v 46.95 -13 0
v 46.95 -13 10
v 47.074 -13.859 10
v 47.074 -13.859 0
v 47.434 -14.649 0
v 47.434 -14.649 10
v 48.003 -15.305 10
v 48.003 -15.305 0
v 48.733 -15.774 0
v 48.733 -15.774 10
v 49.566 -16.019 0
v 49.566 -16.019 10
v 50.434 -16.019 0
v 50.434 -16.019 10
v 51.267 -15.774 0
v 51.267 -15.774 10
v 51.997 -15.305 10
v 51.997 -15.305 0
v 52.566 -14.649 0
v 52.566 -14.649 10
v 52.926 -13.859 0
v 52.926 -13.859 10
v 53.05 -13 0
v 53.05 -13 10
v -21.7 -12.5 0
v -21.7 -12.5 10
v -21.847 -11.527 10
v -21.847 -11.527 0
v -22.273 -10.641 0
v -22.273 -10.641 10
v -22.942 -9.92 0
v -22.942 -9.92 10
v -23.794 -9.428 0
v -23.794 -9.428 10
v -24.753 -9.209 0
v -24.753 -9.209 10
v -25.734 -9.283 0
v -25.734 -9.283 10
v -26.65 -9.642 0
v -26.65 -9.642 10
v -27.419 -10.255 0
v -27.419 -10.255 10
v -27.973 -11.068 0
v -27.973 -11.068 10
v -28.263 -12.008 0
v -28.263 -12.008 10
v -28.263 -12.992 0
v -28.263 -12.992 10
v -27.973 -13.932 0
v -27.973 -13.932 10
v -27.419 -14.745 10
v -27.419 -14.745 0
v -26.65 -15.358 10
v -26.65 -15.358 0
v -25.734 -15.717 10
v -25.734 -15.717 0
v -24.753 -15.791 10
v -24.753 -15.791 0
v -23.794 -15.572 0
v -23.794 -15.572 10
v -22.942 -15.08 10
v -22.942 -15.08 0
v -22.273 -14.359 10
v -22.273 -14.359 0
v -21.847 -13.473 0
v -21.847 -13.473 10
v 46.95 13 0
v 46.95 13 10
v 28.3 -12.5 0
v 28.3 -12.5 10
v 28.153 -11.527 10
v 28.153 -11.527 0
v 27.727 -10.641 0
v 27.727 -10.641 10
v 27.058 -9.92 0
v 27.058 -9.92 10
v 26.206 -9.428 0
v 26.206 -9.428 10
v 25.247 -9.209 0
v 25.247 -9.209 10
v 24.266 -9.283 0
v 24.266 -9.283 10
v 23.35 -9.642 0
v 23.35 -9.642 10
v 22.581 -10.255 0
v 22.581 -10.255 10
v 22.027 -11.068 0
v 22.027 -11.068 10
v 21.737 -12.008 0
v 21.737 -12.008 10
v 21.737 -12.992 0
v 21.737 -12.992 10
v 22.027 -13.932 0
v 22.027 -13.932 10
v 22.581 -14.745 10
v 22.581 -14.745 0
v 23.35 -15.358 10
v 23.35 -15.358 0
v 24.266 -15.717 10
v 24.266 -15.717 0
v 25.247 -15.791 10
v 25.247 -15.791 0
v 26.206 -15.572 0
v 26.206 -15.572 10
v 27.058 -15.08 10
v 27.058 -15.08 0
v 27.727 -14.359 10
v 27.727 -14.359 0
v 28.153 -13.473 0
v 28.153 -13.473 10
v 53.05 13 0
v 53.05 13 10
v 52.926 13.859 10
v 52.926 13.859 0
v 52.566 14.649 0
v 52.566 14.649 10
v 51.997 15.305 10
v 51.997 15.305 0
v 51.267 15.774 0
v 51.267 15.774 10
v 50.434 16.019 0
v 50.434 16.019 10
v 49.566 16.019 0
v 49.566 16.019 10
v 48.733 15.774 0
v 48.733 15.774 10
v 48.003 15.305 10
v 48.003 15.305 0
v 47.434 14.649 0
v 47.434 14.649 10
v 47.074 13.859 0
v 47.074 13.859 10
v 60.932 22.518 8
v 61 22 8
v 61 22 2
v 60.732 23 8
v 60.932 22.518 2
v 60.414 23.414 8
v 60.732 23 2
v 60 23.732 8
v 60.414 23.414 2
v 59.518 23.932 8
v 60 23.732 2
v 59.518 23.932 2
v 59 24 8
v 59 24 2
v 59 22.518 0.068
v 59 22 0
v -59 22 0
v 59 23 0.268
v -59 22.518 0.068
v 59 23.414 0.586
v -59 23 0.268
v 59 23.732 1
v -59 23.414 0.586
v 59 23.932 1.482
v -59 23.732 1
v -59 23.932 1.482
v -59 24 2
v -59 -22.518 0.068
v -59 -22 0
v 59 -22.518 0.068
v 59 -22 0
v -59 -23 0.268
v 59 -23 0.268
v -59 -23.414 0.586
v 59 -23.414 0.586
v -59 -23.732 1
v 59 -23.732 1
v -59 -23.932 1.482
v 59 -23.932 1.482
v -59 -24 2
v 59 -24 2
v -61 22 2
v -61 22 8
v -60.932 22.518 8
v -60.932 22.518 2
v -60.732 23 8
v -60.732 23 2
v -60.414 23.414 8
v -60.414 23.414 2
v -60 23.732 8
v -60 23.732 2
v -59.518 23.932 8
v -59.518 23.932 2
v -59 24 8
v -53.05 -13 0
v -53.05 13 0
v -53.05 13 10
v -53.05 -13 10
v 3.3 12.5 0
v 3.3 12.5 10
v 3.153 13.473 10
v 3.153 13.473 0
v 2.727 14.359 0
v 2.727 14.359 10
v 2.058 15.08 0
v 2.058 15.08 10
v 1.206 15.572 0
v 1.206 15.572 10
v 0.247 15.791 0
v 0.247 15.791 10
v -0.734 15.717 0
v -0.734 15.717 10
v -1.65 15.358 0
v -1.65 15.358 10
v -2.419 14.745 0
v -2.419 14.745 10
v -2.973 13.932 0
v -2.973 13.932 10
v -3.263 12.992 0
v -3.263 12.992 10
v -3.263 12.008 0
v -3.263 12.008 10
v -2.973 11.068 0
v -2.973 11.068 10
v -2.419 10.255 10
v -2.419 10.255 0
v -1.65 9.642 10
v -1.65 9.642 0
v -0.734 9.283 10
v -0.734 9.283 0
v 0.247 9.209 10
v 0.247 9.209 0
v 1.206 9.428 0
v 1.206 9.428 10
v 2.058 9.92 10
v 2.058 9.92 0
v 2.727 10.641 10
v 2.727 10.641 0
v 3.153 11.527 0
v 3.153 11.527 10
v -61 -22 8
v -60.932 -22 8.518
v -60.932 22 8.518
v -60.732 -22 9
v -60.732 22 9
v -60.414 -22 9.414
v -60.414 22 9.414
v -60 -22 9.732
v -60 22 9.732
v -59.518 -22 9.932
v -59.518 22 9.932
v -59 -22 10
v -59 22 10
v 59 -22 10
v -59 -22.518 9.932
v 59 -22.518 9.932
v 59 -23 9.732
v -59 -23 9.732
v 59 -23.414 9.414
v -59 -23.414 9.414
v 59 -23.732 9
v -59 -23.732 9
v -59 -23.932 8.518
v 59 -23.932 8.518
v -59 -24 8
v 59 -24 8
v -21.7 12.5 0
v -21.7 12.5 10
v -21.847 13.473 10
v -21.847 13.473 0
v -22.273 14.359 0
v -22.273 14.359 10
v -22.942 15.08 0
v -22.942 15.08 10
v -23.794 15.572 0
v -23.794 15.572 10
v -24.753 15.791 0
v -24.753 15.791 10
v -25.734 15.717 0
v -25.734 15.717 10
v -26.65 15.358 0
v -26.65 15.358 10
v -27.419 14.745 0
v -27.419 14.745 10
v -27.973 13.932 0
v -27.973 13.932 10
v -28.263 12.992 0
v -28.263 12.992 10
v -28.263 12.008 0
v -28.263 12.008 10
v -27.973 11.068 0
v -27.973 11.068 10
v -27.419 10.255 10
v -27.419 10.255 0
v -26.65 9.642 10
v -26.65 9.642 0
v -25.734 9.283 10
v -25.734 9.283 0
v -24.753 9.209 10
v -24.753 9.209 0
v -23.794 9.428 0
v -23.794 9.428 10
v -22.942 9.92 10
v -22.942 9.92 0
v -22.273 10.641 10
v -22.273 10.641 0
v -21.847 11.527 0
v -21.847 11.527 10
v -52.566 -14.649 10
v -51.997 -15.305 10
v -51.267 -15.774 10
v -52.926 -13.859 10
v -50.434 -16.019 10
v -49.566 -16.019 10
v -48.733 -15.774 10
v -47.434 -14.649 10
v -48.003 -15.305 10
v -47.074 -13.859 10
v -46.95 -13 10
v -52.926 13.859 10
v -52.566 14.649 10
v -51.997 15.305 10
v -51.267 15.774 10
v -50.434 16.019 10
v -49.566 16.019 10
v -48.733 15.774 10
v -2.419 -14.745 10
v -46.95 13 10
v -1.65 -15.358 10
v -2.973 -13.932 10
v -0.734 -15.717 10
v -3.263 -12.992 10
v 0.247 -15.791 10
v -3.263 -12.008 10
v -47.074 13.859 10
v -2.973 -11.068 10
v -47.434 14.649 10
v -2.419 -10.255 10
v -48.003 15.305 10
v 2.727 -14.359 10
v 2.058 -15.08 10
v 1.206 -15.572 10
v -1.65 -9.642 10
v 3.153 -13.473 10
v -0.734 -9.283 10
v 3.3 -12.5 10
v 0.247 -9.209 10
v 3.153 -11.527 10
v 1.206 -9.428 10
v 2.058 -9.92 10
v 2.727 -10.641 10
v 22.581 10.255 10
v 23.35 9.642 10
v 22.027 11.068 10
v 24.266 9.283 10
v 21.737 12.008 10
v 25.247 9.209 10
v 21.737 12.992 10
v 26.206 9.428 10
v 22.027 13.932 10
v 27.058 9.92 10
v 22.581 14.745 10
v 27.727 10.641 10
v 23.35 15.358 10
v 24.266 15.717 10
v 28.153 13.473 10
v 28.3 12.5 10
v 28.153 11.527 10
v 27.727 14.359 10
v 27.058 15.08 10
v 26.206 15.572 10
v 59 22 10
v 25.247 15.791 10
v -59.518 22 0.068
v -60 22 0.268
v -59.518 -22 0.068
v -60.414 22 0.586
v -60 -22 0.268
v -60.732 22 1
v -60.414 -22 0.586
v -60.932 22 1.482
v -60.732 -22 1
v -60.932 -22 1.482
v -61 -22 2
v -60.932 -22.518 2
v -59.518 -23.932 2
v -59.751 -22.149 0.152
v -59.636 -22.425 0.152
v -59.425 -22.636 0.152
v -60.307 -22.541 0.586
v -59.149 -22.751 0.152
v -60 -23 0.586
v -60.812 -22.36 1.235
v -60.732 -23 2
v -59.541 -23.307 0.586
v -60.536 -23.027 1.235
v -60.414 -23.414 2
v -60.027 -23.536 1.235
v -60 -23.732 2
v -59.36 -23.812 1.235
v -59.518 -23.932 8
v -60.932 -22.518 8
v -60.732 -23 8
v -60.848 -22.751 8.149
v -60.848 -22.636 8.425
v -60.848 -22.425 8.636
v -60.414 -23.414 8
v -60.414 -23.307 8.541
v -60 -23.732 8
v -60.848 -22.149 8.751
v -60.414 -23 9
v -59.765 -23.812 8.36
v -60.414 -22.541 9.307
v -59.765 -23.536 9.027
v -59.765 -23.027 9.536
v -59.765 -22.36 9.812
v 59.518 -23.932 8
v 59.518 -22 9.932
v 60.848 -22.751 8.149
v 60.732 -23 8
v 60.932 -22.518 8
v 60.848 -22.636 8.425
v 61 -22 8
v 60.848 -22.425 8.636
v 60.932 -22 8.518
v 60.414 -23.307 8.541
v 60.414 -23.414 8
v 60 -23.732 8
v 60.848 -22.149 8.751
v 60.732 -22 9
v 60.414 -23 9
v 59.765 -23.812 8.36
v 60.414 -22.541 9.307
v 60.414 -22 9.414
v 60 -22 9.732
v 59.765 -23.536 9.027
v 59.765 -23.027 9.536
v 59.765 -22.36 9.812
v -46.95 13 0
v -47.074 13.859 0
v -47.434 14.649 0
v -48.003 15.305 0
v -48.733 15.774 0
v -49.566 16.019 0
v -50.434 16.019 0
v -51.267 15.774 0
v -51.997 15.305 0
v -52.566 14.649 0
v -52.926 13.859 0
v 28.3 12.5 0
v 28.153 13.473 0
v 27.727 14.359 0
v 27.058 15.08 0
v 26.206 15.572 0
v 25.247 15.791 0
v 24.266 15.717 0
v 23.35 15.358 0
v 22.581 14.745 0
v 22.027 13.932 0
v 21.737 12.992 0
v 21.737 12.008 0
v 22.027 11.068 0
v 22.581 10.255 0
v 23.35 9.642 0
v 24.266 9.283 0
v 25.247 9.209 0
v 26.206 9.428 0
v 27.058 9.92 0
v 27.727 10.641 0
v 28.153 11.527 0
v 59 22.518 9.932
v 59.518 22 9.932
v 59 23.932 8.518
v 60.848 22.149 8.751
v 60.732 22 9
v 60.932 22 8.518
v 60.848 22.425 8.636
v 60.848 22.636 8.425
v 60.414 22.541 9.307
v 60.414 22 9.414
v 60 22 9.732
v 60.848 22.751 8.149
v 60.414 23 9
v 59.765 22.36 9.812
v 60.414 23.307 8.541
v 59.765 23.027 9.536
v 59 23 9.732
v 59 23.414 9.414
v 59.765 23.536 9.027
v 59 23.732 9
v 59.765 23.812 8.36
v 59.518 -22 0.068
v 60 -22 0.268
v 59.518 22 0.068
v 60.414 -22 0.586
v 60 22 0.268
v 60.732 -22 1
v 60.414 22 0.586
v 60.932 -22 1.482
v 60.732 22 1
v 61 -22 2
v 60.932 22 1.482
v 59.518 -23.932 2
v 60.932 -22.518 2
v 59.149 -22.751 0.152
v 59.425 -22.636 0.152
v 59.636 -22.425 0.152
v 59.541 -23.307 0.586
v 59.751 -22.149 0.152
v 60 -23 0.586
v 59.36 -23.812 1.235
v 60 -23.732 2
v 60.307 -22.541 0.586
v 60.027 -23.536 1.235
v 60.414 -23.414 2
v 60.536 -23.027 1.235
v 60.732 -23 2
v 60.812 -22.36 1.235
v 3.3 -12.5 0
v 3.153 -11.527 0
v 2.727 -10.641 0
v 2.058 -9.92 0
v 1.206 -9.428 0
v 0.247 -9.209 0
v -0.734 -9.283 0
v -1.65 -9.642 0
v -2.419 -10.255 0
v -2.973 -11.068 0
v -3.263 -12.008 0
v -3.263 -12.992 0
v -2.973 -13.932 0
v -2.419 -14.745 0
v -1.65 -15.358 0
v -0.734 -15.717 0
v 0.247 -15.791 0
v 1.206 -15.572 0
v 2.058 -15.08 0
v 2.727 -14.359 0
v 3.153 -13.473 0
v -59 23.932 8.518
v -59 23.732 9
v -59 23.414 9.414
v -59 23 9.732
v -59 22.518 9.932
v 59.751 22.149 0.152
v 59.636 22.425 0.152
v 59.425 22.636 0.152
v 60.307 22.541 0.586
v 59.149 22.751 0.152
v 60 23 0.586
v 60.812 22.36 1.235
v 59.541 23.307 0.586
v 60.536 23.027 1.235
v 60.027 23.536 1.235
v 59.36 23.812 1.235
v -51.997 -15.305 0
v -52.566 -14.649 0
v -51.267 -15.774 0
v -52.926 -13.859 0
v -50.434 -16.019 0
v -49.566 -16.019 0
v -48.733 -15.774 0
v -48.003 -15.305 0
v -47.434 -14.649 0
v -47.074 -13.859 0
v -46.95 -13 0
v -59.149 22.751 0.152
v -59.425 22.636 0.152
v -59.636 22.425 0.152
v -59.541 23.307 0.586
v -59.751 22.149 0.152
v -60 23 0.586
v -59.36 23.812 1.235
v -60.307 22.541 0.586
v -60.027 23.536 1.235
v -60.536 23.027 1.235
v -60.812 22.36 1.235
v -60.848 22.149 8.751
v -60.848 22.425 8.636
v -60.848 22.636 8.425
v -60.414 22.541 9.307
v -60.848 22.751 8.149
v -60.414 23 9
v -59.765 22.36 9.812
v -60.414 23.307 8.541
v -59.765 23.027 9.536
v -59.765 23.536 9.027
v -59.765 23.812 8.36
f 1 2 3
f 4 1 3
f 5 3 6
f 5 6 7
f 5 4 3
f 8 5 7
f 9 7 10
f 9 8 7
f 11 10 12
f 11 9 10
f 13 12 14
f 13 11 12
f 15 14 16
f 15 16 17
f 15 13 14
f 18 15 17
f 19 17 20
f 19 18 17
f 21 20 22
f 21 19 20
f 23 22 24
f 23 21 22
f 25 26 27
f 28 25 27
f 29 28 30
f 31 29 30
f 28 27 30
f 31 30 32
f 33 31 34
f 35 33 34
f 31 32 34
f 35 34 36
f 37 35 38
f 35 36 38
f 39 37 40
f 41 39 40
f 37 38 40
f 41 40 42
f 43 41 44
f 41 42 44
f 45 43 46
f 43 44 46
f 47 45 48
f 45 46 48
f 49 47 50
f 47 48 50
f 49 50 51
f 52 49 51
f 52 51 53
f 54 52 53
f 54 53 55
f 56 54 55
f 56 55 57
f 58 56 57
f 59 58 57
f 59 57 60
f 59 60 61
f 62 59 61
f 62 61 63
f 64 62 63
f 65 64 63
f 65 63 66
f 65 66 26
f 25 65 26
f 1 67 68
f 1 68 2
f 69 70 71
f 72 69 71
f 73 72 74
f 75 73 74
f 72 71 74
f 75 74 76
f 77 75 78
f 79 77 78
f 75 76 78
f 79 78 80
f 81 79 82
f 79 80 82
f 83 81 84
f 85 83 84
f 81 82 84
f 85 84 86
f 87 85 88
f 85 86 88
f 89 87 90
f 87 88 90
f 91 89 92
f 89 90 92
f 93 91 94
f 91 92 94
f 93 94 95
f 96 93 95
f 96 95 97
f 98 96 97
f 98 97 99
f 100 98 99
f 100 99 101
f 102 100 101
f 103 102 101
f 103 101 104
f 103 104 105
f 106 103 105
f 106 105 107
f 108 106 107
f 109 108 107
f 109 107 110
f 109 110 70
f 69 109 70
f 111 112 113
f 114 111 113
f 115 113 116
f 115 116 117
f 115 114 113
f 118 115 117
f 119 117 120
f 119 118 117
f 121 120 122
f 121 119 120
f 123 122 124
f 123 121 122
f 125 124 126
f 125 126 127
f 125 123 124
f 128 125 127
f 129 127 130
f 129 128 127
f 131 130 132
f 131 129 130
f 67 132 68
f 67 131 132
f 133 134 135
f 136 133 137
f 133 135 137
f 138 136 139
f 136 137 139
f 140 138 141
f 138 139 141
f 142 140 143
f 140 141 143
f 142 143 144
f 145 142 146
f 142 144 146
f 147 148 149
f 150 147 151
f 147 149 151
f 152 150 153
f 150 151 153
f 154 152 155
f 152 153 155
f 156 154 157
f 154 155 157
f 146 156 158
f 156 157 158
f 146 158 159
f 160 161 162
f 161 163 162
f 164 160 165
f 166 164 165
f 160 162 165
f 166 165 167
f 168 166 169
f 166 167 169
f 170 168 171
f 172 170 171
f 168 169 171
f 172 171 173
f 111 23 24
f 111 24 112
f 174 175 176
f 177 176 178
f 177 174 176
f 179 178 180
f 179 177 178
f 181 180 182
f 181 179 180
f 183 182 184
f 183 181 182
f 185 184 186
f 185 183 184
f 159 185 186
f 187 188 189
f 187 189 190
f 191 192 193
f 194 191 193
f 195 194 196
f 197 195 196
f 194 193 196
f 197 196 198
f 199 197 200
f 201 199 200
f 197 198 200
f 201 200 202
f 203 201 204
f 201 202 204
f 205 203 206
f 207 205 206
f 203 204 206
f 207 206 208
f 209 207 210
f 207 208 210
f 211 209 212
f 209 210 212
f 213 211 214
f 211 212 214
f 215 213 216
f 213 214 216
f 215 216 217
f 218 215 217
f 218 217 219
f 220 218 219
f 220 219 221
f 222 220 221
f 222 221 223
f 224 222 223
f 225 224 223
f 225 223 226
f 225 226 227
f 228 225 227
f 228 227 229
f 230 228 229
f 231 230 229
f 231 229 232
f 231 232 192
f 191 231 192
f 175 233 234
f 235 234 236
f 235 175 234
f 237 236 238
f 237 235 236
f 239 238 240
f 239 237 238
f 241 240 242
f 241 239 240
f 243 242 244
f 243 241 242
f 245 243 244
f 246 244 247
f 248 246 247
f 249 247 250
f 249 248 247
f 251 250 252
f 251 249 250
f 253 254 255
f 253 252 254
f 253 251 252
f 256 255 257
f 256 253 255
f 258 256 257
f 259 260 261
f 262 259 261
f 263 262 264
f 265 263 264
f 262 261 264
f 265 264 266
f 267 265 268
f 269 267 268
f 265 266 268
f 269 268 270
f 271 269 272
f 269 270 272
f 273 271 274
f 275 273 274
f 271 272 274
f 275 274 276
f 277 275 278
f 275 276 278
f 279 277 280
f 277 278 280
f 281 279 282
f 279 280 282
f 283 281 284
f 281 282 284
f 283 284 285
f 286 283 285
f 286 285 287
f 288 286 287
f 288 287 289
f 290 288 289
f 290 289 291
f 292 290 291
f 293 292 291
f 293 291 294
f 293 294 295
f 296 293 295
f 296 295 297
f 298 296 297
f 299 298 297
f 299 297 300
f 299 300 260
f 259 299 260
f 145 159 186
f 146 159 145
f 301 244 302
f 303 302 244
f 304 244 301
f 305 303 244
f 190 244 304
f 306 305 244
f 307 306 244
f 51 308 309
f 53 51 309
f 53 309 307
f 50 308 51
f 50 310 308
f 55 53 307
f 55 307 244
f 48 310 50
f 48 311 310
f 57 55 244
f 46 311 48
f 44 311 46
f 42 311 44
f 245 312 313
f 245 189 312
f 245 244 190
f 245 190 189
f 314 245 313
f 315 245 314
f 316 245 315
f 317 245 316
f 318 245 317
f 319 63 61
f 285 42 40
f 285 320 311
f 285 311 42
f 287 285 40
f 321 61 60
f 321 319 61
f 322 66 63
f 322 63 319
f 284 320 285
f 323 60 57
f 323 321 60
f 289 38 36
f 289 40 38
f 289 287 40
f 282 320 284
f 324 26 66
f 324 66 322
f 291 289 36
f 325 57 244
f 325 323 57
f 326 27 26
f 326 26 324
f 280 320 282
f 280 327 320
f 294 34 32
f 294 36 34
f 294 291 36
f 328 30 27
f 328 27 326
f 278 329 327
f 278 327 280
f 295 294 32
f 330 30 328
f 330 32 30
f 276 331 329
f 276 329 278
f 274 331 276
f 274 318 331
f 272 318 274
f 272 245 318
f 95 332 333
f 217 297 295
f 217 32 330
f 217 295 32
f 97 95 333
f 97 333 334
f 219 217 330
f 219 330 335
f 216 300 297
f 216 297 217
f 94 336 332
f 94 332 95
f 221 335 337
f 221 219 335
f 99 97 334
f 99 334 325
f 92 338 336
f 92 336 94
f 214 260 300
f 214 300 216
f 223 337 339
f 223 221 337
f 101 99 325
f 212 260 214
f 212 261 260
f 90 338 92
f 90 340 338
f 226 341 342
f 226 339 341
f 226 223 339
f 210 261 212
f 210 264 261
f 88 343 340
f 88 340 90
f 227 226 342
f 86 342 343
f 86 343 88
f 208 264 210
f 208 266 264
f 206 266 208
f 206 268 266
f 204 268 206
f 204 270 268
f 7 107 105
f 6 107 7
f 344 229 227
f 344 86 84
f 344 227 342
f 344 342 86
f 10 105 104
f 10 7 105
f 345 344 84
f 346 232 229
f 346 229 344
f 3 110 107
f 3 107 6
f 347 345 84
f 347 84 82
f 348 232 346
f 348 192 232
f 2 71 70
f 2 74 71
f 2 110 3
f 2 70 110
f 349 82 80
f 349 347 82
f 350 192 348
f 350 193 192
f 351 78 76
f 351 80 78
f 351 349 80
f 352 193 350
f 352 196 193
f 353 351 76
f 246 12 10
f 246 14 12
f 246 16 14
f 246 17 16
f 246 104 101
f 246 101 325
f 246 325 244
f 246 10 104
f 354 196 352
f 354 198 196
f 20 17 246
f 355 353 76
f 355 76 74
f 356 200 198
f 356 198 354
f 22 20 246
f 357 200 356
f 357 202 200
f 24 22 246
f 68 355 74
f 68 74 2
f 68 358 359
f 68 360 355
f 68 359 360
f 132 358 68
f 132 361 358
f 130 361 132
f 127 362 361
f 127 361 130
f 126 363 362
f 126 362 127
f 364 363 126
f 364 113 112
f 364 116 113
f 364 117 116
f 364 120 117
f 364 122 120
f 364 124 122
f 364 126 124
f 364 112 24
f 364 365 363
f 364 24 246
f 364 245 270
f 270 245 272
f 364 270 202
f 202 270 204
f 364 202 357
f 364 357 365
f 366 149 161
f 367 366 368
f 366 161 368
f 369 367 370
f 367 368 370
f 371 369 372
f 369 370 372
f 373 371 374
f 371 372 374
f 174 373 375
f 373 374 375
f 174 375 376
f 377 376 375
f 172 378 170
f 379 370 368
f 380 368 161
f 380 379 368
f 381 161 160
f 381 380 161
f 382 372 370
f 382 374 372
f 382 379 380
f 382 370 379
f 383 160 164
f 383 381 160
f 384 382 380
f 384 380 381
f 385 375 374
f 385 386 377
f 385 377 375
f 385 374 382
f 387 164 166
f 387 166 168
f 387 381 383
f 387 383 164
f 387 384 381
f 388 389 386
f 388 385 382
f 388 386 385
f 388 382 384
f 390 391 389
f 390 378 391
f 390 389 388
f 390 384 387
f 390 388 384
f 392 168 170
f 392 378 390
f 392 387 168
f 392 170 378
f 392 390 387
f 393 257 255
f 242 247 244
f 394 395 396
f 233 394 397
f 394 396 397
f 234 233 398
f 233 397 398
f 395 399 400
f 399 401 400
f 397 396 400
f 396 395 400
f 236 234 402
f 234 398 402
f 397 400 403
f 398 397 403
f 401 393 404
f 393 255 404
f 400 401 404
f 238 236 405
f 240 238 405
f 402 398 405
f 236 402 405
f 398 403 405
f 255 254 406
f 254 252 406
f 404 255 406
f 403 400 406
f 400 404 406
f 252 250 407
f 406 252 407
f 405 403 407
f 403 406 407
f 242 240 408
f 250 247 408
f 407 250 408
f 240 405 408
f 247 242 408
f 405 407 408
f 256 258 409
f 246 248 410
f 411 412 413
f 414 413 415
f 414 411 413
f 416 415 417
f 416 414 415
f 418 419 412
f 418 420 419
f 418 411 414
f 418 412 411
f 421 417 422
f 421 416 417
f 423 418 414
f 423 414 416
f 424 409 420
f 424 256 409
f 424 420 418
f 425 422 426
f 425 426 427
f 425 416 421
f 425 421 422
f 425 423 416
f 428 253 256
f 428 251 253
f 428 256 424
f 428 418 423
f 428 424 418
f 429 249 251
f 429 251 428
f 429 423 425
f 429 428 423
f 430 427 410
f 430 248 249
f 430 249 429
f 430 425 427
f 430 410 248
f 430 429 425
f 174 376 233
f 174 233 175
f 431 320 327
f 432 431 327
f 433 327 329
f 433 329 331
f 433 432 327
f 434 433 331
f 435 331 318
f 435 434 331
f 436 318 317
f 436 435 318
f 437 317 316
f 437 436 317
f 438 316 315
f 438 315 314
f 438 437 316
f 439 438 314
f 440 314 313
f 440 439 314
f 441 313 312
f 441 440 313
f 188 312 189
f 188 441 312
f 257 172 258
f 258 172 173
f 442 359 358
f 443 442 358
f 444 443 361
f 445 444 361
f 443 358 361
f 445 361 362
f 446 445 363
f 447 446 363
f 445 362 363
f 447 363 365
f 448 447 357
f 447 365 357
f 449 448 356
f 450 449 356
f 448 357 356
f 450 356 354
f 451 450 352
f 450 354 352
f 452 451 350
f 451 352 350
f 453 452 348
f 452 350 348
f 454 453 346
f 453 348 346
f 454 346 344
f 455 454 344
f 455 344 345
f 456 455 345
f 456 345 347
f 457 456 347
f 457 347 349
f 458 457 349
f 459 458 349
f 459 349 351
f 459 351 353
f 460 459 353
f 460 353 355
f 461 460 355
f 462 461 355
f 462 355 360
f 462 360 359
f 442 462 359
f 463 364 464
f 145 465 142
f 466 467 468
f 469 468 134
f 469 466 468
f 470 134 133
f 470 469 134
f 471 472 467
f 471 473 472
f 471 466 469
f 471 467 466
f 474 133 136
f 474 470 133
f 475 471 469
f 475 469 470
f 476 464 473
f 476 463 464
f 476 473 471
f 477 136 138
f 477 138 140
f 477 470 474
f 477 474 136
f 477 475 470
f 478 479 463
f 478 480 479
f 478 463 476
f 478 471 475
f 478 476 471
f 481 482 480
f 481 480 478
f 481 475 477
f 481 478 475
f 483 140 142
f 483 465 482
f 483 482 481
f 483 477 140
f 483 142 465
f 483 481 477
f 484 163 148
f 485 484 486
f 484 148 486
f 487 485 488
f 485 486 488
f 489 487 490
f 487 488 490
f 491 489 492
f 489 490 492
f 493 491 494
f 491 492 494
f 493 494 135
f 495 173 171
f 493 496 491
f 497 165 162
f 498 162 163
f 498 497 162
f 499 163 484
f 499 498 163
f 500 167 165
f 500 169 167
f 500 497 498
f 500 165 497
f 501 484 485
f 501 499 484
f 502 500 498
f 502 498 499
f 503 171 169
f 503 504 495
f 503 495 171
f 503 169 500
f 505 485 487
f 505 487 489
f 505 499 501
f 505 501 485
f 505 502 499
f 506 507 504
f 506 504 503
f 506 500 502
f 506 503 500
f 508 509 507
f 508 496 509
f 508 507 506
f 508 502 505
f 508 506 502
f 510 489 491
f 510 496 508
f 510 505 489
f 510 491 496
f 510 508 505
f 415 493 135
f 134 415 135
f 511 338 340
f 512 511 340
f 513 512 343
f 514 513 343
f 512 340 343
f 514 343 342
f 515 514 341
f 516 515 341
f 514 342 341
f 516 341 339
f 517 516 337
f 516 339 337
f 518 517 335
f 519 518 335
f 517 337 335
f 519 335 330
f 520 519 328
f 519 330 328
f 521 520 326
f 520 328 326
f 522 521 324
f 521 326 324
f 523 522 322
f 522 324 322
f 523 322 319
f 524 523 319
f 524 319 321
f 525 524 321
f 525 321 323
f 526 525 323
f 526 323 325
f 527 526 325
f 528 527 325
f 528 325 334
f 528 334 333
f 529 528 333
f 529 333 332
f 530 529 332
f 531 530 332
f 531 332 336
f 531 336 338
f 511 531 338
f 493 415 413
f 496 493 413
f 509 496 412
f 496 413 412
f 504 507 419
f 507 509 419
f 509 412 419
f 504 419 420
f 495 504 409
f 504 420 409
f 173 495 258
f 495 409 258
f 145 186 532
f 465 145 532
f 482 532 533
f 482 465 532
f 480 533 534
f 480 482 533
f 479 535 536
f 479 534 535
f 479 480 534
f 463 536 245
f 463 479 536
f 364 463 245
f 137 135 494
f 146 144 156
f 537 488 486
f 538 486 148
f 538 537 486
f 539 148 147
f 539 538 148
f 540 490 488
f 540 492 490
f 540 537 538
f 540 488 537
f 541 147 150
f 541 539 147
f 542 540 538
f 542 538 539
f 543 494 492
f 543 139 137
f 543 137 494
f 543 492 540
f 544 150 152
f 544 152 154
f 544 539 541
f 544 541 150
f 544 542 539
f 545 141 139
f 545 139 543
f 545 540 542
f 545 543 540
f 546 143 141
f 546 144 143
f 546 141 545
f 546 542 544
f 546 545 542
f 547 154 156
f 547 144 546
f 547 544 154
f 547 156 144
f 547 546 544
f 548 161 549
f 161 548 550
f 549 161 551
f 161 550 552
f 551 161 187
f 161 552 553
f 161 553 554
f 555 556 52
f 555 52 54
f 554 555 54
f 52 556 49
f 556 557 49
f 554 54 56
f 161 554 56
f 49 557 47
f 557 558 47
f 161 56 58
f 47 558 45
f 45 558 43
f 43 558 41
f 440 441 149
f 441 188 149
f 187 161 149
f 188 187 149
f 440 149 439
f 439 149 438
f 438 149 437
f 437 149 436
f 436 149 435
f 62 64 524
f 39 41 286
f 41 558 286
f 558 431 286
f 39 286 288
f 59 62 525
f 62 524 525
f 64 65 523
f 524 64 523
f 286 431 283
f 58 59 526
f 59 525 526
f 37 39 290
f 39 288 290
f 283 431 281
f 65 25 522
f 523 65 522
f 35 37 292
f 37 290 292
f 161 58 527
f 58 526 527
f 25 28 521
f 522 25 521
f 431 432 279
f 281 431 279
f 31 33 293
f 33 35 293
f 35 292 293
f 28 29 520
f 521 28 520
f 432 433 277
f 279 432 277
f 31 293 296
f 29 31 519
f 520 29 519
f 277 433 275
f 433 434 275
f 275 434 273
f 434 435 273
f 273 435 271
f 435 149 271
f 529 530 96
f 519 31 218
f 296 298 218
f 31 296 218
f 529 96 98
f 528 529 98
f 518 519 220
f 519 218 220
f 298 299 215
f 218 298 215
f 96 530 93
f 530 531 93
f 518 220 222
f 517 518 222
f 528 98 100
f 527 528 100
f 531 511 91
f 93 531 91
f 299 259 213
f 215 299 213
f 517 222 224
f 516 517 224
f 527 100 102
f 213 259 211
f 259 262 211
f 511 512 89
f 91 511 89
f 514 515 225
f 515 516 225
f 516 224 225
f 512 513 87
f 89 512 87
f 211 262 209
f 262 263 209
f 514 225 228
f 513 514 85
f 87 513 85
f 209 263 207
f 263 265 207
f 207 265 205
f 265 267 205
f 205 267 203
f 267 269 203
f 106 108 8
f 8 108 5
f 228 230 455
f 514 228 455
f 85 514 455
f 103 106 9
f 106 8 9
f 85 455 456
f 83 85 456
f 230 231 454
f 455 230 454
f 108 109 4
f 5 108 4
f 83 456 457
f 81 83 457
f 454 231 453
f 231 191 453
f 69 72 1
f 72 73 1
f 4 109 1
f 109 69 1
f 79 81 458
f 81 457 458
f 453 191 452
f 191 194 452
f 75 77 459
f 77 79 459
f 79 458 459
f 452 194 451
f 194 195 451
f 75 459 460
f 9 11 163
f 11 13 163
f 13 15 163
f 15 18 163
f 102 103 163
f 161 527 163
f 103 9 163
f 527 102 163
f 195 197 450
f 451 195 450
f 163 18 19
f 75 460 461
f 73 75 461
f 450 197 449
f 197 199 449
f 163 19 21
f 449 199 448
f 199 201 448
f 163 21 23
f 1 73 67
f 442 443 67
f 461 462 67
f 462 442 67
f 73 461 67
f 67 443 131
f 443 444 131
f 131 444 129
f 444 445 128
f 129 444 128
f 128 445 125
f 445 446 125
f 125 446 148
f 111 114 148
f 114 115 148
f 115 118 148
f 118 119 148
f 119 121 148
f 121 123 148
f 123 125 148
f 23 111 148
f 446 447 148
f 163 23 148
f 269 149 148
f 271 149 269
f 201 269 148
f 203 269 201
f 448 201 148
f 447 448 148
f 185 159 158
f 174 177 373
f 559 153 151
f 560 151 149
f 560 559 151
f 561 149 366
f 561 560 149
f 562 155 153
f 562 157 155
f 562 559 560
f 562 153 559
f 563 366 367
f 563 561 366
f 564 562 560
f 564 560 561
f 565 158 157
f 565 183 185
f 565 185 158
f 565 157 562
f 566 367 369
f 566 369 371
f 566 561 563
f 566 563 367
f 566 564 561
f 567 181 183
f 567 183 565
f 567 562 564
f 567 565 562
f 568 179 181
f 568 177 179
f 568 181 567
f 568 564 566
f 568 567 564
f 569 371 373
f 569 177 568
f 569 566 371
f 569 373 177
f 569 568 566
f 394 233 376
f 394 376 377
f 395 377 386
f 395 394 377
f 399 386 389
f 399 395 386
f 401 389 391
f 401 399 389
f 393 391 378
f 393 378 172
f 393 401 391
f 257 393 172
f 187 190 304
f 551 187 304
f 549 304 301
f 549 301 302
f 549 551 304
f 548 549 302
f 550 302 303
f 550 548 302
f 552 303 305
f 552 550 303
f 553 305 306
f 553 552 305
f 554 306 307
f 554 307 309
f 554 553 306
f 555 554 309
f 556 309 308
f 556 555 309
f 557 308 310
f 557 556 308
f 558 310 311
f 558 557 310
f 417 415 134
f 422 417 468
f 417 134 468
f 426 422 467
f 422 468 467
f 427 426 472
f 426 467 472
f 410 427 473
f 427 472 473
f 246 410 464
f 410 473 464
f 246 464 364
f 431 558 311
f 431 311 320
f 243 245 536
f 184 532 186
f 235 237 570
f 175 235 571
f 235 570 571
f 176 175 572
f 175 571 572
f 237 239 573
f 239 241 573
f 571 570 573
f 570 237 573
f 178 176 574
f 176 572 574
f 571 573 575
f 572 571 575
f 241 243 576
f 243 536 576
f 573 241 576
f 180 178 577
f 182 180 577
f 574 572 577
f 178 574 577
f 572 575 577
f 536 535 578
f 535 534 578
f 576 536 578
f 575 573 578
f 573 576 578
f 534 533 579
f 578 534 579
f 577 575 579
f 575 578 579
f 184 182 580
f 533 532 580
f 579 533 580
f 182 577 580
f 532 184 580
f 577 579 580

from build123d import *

# Parameters (mm, degrees)
SKETCH_W    = 122
SKETCH_H    = 48
PAD_DEPTH   = 10
SKETCH001_R = 3.3
HOLE_DEPTH  = 10.001
FILLET_R    = 2
FILLET001_R = 2
FILLET002_R = 2
FILLET003_R = 2
FILLET004_R = 2


with BuildPart() as part:
    # Sketch → Pad (new body)
    with BuildSketch(Plane.XY):
        Rectangle(SKETCH_W, SKETCH_H)
        with BuildLine():
            ThreePointArc((53.05, 13), (50, 16.05), (46.95, 13))
            Line((46.95, 13), (46.95, -13))
            ThreePointArc((46.95, -13), (50, -16.05), (53.05, -13))
            Line((53.05, -13), (53.05, 13))
        make_face(mode=Mode.SUBTRACT)
        with BuildLine():
            ThreePointArc((-46.95, 13), (-50, 16.05), (-53.05, 13))
            Line((-53.05, 13), (-53.05, -13))
            ThreePointArc((-53.05, -13), (-50, -16.05), (-46.95, -13))
            Line((-46.95, -13), (-46.95, 13))
        make_face(mode=Mode.SUBTRACT)
    extrude(amount=PAD_DEPTH)

    # Sketch001 (on Face14 of Pad) → Hole (cut, through all)
    with BuildSketch(Plane.XY.offset(10)):
        with Locations((0, 12.5)):
            Circle(SKETCH001_R)
        with Locations((25, 12.5)):
            Circle(SKETCH001_R)
        with Locations((0, -12.5)):
            Circle(SKETCH001_R)
        with Locations((25, -12.5)):
            Circle(SKETCH001_R)
        with Locations((-25, 12.5)):
            Circle(SKETCH001_R)
        with Locations((-25, -12.5)):
            Circle(SKETCH001_R)
    extrude(amount=-HOLE_DEPTH, mode=Mode.SUBTRACT)

    # Fillet
    fillet_edges = [part.edges().sort_by_distance(p)[0] for p in [
        (0, 24, 10),
    ]]
    fillet(fillet_edges, radius=FILLET_R)

    # Fillet001
    fillet001_edges = [part.edges().sort_by_distance(p)[0] for p in [
        (0, -24, 10),
    ]]
    fillet(fillet001_edges, radius=FILLET001_R)

    # Fillet002
    fillet002_edges = [part.edges().sort_by_distance(p)[0] for p in [
        (-61, 0, 10),
    ]]
    fillet(fillet002_edges, radius=FILLET002_R)

    # Fillet003
    fillet003_edges = [part.edges().sort_by_distance(p)[0] for p in [
        (61, 0, 10),
    ]]
    fillet(fillet003_edges, radius=FILLET003_R)

    # Fillet004
    fillet004_edges = [part.edges().sort_by_distance(p)[0] for p in [
        (0, -24, 0),
    ]]
    fillet(fillet004_edges, radius=FILLET004_R)


solid = part.part
